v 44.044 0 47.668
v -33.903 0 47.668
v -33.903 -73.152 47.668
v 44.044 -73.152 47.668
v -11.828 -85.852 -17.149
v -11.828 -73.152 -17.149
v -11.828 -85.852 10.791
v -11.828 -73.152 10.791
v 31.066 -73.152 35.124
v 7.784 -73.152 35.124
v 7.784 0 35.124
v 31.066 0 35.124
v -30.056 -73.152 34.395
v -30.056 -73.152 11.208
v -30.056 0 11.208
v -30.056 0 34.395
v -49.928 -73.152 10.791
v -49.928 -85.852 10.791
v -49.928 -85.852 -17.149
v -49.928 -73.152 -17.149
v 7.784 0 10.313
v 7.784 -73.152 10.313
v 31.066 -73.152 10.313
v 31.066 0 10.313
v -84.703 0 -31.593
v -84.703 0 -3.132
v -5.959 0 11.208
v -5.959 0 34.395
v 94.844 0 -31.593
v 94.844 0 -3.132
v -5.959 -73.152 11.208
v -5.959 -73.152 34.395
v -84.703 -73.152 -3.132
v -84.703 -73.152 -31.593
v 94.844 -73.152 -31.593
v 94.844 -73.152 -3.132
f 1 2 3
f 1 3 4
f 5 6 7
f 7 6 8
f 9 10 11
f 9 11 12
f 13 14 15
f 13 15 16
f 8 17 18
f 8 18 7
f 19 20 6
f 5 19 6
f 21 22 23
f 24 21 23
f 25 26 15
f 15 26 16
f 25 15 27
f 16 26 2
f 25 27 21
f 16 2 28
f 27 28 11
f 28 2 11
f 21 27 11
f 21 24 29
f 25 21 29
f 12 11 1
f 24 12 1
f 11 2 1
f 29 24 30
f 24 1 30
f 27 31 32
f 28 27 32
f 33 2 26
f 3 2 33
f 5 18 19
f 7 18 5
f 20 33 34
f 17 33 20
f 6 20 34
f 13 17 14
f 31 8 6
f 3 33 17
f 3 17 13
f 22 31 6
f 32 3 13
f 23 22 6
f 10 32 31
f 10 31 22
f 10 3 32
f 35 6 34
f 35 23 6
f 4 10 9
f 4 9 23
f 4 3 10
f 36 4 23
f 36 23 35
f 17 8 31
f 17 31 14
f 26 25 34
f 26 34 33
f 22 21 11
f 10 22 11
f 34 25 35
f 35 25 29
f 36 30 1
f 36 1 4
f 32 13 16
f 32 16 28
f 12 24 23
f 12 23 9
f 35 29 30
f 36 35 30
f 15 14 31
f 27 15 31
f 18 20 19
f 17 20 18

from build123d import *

# Parameters (mm, degrees)
F0_W     = 179.547206
F0_H     = 79.261191
F1_DEPTH = 73.152
F2_SIZE  = 50.8
F3_W     = 24.096457
F3_H     = 23.186842
F4_DEPTH = 286.004
F5_W     = 23.281777
F5_H     = 24.811177
F6_DEPTH = 221.742
F7_SIZE  = 50.8
F8_W     = 38.1
F8_H     = 27.94
F9_DEPTH = 12.7


with BuildPart() as f1:
    # F0 (on Front) → F1 (new body)
    with BuildSketch(Plane.XZ):
        with Locations((5.070895, 8.037225)):
            Rectangle(F0_W, F0_H)
    extrude(amount=F1_DEPTH)

    # F2
    f2_edges = [f1.edges().sort_by_distance(p)[0] for p in [
        (-84.702708, -36.576, 47.66782),
    ]]
    chamfer(f2_edges, length=F2_SIZE)

    # F3 (on face) → F4 (cut)
    with BuildSketch(Plane.XZ.offset(73.152)):
        with Locations((-18.007661, 22.801763)):
            Rectangle(F3_W, F3_H)
    extrude(amount=-F4_DEPTH, mode=Mode.SUBTRACT)

    # F5 (on face) → F6 (cut)
    with BuildSketch(Plane.XZ.offset(73.152)):
        with Locations((19.424999, 22.71818)):
            Rectangle(F5_W, F5_H)
    extrude(amount=-F6_DEPTH, mode=Mode.SUBTRACT)

    # F7
    f7_edges = [f1.edges().sort_by_distance(p)[0] for p in [
        (94.844498, -36.576, 47.66782),
    ]]
    chamfer(f7_edges, length=F7_SIZE)

    # F8 (on face) → F9 (join)
    with BuildSketch(Plane.XZ.offset(73.152)):
        with Locations((-30.878472, -3.178807)):
            Rectangle(F8_W, F8_H)
    extrude(amount=F9_DEPTH)


solid = f1.part
